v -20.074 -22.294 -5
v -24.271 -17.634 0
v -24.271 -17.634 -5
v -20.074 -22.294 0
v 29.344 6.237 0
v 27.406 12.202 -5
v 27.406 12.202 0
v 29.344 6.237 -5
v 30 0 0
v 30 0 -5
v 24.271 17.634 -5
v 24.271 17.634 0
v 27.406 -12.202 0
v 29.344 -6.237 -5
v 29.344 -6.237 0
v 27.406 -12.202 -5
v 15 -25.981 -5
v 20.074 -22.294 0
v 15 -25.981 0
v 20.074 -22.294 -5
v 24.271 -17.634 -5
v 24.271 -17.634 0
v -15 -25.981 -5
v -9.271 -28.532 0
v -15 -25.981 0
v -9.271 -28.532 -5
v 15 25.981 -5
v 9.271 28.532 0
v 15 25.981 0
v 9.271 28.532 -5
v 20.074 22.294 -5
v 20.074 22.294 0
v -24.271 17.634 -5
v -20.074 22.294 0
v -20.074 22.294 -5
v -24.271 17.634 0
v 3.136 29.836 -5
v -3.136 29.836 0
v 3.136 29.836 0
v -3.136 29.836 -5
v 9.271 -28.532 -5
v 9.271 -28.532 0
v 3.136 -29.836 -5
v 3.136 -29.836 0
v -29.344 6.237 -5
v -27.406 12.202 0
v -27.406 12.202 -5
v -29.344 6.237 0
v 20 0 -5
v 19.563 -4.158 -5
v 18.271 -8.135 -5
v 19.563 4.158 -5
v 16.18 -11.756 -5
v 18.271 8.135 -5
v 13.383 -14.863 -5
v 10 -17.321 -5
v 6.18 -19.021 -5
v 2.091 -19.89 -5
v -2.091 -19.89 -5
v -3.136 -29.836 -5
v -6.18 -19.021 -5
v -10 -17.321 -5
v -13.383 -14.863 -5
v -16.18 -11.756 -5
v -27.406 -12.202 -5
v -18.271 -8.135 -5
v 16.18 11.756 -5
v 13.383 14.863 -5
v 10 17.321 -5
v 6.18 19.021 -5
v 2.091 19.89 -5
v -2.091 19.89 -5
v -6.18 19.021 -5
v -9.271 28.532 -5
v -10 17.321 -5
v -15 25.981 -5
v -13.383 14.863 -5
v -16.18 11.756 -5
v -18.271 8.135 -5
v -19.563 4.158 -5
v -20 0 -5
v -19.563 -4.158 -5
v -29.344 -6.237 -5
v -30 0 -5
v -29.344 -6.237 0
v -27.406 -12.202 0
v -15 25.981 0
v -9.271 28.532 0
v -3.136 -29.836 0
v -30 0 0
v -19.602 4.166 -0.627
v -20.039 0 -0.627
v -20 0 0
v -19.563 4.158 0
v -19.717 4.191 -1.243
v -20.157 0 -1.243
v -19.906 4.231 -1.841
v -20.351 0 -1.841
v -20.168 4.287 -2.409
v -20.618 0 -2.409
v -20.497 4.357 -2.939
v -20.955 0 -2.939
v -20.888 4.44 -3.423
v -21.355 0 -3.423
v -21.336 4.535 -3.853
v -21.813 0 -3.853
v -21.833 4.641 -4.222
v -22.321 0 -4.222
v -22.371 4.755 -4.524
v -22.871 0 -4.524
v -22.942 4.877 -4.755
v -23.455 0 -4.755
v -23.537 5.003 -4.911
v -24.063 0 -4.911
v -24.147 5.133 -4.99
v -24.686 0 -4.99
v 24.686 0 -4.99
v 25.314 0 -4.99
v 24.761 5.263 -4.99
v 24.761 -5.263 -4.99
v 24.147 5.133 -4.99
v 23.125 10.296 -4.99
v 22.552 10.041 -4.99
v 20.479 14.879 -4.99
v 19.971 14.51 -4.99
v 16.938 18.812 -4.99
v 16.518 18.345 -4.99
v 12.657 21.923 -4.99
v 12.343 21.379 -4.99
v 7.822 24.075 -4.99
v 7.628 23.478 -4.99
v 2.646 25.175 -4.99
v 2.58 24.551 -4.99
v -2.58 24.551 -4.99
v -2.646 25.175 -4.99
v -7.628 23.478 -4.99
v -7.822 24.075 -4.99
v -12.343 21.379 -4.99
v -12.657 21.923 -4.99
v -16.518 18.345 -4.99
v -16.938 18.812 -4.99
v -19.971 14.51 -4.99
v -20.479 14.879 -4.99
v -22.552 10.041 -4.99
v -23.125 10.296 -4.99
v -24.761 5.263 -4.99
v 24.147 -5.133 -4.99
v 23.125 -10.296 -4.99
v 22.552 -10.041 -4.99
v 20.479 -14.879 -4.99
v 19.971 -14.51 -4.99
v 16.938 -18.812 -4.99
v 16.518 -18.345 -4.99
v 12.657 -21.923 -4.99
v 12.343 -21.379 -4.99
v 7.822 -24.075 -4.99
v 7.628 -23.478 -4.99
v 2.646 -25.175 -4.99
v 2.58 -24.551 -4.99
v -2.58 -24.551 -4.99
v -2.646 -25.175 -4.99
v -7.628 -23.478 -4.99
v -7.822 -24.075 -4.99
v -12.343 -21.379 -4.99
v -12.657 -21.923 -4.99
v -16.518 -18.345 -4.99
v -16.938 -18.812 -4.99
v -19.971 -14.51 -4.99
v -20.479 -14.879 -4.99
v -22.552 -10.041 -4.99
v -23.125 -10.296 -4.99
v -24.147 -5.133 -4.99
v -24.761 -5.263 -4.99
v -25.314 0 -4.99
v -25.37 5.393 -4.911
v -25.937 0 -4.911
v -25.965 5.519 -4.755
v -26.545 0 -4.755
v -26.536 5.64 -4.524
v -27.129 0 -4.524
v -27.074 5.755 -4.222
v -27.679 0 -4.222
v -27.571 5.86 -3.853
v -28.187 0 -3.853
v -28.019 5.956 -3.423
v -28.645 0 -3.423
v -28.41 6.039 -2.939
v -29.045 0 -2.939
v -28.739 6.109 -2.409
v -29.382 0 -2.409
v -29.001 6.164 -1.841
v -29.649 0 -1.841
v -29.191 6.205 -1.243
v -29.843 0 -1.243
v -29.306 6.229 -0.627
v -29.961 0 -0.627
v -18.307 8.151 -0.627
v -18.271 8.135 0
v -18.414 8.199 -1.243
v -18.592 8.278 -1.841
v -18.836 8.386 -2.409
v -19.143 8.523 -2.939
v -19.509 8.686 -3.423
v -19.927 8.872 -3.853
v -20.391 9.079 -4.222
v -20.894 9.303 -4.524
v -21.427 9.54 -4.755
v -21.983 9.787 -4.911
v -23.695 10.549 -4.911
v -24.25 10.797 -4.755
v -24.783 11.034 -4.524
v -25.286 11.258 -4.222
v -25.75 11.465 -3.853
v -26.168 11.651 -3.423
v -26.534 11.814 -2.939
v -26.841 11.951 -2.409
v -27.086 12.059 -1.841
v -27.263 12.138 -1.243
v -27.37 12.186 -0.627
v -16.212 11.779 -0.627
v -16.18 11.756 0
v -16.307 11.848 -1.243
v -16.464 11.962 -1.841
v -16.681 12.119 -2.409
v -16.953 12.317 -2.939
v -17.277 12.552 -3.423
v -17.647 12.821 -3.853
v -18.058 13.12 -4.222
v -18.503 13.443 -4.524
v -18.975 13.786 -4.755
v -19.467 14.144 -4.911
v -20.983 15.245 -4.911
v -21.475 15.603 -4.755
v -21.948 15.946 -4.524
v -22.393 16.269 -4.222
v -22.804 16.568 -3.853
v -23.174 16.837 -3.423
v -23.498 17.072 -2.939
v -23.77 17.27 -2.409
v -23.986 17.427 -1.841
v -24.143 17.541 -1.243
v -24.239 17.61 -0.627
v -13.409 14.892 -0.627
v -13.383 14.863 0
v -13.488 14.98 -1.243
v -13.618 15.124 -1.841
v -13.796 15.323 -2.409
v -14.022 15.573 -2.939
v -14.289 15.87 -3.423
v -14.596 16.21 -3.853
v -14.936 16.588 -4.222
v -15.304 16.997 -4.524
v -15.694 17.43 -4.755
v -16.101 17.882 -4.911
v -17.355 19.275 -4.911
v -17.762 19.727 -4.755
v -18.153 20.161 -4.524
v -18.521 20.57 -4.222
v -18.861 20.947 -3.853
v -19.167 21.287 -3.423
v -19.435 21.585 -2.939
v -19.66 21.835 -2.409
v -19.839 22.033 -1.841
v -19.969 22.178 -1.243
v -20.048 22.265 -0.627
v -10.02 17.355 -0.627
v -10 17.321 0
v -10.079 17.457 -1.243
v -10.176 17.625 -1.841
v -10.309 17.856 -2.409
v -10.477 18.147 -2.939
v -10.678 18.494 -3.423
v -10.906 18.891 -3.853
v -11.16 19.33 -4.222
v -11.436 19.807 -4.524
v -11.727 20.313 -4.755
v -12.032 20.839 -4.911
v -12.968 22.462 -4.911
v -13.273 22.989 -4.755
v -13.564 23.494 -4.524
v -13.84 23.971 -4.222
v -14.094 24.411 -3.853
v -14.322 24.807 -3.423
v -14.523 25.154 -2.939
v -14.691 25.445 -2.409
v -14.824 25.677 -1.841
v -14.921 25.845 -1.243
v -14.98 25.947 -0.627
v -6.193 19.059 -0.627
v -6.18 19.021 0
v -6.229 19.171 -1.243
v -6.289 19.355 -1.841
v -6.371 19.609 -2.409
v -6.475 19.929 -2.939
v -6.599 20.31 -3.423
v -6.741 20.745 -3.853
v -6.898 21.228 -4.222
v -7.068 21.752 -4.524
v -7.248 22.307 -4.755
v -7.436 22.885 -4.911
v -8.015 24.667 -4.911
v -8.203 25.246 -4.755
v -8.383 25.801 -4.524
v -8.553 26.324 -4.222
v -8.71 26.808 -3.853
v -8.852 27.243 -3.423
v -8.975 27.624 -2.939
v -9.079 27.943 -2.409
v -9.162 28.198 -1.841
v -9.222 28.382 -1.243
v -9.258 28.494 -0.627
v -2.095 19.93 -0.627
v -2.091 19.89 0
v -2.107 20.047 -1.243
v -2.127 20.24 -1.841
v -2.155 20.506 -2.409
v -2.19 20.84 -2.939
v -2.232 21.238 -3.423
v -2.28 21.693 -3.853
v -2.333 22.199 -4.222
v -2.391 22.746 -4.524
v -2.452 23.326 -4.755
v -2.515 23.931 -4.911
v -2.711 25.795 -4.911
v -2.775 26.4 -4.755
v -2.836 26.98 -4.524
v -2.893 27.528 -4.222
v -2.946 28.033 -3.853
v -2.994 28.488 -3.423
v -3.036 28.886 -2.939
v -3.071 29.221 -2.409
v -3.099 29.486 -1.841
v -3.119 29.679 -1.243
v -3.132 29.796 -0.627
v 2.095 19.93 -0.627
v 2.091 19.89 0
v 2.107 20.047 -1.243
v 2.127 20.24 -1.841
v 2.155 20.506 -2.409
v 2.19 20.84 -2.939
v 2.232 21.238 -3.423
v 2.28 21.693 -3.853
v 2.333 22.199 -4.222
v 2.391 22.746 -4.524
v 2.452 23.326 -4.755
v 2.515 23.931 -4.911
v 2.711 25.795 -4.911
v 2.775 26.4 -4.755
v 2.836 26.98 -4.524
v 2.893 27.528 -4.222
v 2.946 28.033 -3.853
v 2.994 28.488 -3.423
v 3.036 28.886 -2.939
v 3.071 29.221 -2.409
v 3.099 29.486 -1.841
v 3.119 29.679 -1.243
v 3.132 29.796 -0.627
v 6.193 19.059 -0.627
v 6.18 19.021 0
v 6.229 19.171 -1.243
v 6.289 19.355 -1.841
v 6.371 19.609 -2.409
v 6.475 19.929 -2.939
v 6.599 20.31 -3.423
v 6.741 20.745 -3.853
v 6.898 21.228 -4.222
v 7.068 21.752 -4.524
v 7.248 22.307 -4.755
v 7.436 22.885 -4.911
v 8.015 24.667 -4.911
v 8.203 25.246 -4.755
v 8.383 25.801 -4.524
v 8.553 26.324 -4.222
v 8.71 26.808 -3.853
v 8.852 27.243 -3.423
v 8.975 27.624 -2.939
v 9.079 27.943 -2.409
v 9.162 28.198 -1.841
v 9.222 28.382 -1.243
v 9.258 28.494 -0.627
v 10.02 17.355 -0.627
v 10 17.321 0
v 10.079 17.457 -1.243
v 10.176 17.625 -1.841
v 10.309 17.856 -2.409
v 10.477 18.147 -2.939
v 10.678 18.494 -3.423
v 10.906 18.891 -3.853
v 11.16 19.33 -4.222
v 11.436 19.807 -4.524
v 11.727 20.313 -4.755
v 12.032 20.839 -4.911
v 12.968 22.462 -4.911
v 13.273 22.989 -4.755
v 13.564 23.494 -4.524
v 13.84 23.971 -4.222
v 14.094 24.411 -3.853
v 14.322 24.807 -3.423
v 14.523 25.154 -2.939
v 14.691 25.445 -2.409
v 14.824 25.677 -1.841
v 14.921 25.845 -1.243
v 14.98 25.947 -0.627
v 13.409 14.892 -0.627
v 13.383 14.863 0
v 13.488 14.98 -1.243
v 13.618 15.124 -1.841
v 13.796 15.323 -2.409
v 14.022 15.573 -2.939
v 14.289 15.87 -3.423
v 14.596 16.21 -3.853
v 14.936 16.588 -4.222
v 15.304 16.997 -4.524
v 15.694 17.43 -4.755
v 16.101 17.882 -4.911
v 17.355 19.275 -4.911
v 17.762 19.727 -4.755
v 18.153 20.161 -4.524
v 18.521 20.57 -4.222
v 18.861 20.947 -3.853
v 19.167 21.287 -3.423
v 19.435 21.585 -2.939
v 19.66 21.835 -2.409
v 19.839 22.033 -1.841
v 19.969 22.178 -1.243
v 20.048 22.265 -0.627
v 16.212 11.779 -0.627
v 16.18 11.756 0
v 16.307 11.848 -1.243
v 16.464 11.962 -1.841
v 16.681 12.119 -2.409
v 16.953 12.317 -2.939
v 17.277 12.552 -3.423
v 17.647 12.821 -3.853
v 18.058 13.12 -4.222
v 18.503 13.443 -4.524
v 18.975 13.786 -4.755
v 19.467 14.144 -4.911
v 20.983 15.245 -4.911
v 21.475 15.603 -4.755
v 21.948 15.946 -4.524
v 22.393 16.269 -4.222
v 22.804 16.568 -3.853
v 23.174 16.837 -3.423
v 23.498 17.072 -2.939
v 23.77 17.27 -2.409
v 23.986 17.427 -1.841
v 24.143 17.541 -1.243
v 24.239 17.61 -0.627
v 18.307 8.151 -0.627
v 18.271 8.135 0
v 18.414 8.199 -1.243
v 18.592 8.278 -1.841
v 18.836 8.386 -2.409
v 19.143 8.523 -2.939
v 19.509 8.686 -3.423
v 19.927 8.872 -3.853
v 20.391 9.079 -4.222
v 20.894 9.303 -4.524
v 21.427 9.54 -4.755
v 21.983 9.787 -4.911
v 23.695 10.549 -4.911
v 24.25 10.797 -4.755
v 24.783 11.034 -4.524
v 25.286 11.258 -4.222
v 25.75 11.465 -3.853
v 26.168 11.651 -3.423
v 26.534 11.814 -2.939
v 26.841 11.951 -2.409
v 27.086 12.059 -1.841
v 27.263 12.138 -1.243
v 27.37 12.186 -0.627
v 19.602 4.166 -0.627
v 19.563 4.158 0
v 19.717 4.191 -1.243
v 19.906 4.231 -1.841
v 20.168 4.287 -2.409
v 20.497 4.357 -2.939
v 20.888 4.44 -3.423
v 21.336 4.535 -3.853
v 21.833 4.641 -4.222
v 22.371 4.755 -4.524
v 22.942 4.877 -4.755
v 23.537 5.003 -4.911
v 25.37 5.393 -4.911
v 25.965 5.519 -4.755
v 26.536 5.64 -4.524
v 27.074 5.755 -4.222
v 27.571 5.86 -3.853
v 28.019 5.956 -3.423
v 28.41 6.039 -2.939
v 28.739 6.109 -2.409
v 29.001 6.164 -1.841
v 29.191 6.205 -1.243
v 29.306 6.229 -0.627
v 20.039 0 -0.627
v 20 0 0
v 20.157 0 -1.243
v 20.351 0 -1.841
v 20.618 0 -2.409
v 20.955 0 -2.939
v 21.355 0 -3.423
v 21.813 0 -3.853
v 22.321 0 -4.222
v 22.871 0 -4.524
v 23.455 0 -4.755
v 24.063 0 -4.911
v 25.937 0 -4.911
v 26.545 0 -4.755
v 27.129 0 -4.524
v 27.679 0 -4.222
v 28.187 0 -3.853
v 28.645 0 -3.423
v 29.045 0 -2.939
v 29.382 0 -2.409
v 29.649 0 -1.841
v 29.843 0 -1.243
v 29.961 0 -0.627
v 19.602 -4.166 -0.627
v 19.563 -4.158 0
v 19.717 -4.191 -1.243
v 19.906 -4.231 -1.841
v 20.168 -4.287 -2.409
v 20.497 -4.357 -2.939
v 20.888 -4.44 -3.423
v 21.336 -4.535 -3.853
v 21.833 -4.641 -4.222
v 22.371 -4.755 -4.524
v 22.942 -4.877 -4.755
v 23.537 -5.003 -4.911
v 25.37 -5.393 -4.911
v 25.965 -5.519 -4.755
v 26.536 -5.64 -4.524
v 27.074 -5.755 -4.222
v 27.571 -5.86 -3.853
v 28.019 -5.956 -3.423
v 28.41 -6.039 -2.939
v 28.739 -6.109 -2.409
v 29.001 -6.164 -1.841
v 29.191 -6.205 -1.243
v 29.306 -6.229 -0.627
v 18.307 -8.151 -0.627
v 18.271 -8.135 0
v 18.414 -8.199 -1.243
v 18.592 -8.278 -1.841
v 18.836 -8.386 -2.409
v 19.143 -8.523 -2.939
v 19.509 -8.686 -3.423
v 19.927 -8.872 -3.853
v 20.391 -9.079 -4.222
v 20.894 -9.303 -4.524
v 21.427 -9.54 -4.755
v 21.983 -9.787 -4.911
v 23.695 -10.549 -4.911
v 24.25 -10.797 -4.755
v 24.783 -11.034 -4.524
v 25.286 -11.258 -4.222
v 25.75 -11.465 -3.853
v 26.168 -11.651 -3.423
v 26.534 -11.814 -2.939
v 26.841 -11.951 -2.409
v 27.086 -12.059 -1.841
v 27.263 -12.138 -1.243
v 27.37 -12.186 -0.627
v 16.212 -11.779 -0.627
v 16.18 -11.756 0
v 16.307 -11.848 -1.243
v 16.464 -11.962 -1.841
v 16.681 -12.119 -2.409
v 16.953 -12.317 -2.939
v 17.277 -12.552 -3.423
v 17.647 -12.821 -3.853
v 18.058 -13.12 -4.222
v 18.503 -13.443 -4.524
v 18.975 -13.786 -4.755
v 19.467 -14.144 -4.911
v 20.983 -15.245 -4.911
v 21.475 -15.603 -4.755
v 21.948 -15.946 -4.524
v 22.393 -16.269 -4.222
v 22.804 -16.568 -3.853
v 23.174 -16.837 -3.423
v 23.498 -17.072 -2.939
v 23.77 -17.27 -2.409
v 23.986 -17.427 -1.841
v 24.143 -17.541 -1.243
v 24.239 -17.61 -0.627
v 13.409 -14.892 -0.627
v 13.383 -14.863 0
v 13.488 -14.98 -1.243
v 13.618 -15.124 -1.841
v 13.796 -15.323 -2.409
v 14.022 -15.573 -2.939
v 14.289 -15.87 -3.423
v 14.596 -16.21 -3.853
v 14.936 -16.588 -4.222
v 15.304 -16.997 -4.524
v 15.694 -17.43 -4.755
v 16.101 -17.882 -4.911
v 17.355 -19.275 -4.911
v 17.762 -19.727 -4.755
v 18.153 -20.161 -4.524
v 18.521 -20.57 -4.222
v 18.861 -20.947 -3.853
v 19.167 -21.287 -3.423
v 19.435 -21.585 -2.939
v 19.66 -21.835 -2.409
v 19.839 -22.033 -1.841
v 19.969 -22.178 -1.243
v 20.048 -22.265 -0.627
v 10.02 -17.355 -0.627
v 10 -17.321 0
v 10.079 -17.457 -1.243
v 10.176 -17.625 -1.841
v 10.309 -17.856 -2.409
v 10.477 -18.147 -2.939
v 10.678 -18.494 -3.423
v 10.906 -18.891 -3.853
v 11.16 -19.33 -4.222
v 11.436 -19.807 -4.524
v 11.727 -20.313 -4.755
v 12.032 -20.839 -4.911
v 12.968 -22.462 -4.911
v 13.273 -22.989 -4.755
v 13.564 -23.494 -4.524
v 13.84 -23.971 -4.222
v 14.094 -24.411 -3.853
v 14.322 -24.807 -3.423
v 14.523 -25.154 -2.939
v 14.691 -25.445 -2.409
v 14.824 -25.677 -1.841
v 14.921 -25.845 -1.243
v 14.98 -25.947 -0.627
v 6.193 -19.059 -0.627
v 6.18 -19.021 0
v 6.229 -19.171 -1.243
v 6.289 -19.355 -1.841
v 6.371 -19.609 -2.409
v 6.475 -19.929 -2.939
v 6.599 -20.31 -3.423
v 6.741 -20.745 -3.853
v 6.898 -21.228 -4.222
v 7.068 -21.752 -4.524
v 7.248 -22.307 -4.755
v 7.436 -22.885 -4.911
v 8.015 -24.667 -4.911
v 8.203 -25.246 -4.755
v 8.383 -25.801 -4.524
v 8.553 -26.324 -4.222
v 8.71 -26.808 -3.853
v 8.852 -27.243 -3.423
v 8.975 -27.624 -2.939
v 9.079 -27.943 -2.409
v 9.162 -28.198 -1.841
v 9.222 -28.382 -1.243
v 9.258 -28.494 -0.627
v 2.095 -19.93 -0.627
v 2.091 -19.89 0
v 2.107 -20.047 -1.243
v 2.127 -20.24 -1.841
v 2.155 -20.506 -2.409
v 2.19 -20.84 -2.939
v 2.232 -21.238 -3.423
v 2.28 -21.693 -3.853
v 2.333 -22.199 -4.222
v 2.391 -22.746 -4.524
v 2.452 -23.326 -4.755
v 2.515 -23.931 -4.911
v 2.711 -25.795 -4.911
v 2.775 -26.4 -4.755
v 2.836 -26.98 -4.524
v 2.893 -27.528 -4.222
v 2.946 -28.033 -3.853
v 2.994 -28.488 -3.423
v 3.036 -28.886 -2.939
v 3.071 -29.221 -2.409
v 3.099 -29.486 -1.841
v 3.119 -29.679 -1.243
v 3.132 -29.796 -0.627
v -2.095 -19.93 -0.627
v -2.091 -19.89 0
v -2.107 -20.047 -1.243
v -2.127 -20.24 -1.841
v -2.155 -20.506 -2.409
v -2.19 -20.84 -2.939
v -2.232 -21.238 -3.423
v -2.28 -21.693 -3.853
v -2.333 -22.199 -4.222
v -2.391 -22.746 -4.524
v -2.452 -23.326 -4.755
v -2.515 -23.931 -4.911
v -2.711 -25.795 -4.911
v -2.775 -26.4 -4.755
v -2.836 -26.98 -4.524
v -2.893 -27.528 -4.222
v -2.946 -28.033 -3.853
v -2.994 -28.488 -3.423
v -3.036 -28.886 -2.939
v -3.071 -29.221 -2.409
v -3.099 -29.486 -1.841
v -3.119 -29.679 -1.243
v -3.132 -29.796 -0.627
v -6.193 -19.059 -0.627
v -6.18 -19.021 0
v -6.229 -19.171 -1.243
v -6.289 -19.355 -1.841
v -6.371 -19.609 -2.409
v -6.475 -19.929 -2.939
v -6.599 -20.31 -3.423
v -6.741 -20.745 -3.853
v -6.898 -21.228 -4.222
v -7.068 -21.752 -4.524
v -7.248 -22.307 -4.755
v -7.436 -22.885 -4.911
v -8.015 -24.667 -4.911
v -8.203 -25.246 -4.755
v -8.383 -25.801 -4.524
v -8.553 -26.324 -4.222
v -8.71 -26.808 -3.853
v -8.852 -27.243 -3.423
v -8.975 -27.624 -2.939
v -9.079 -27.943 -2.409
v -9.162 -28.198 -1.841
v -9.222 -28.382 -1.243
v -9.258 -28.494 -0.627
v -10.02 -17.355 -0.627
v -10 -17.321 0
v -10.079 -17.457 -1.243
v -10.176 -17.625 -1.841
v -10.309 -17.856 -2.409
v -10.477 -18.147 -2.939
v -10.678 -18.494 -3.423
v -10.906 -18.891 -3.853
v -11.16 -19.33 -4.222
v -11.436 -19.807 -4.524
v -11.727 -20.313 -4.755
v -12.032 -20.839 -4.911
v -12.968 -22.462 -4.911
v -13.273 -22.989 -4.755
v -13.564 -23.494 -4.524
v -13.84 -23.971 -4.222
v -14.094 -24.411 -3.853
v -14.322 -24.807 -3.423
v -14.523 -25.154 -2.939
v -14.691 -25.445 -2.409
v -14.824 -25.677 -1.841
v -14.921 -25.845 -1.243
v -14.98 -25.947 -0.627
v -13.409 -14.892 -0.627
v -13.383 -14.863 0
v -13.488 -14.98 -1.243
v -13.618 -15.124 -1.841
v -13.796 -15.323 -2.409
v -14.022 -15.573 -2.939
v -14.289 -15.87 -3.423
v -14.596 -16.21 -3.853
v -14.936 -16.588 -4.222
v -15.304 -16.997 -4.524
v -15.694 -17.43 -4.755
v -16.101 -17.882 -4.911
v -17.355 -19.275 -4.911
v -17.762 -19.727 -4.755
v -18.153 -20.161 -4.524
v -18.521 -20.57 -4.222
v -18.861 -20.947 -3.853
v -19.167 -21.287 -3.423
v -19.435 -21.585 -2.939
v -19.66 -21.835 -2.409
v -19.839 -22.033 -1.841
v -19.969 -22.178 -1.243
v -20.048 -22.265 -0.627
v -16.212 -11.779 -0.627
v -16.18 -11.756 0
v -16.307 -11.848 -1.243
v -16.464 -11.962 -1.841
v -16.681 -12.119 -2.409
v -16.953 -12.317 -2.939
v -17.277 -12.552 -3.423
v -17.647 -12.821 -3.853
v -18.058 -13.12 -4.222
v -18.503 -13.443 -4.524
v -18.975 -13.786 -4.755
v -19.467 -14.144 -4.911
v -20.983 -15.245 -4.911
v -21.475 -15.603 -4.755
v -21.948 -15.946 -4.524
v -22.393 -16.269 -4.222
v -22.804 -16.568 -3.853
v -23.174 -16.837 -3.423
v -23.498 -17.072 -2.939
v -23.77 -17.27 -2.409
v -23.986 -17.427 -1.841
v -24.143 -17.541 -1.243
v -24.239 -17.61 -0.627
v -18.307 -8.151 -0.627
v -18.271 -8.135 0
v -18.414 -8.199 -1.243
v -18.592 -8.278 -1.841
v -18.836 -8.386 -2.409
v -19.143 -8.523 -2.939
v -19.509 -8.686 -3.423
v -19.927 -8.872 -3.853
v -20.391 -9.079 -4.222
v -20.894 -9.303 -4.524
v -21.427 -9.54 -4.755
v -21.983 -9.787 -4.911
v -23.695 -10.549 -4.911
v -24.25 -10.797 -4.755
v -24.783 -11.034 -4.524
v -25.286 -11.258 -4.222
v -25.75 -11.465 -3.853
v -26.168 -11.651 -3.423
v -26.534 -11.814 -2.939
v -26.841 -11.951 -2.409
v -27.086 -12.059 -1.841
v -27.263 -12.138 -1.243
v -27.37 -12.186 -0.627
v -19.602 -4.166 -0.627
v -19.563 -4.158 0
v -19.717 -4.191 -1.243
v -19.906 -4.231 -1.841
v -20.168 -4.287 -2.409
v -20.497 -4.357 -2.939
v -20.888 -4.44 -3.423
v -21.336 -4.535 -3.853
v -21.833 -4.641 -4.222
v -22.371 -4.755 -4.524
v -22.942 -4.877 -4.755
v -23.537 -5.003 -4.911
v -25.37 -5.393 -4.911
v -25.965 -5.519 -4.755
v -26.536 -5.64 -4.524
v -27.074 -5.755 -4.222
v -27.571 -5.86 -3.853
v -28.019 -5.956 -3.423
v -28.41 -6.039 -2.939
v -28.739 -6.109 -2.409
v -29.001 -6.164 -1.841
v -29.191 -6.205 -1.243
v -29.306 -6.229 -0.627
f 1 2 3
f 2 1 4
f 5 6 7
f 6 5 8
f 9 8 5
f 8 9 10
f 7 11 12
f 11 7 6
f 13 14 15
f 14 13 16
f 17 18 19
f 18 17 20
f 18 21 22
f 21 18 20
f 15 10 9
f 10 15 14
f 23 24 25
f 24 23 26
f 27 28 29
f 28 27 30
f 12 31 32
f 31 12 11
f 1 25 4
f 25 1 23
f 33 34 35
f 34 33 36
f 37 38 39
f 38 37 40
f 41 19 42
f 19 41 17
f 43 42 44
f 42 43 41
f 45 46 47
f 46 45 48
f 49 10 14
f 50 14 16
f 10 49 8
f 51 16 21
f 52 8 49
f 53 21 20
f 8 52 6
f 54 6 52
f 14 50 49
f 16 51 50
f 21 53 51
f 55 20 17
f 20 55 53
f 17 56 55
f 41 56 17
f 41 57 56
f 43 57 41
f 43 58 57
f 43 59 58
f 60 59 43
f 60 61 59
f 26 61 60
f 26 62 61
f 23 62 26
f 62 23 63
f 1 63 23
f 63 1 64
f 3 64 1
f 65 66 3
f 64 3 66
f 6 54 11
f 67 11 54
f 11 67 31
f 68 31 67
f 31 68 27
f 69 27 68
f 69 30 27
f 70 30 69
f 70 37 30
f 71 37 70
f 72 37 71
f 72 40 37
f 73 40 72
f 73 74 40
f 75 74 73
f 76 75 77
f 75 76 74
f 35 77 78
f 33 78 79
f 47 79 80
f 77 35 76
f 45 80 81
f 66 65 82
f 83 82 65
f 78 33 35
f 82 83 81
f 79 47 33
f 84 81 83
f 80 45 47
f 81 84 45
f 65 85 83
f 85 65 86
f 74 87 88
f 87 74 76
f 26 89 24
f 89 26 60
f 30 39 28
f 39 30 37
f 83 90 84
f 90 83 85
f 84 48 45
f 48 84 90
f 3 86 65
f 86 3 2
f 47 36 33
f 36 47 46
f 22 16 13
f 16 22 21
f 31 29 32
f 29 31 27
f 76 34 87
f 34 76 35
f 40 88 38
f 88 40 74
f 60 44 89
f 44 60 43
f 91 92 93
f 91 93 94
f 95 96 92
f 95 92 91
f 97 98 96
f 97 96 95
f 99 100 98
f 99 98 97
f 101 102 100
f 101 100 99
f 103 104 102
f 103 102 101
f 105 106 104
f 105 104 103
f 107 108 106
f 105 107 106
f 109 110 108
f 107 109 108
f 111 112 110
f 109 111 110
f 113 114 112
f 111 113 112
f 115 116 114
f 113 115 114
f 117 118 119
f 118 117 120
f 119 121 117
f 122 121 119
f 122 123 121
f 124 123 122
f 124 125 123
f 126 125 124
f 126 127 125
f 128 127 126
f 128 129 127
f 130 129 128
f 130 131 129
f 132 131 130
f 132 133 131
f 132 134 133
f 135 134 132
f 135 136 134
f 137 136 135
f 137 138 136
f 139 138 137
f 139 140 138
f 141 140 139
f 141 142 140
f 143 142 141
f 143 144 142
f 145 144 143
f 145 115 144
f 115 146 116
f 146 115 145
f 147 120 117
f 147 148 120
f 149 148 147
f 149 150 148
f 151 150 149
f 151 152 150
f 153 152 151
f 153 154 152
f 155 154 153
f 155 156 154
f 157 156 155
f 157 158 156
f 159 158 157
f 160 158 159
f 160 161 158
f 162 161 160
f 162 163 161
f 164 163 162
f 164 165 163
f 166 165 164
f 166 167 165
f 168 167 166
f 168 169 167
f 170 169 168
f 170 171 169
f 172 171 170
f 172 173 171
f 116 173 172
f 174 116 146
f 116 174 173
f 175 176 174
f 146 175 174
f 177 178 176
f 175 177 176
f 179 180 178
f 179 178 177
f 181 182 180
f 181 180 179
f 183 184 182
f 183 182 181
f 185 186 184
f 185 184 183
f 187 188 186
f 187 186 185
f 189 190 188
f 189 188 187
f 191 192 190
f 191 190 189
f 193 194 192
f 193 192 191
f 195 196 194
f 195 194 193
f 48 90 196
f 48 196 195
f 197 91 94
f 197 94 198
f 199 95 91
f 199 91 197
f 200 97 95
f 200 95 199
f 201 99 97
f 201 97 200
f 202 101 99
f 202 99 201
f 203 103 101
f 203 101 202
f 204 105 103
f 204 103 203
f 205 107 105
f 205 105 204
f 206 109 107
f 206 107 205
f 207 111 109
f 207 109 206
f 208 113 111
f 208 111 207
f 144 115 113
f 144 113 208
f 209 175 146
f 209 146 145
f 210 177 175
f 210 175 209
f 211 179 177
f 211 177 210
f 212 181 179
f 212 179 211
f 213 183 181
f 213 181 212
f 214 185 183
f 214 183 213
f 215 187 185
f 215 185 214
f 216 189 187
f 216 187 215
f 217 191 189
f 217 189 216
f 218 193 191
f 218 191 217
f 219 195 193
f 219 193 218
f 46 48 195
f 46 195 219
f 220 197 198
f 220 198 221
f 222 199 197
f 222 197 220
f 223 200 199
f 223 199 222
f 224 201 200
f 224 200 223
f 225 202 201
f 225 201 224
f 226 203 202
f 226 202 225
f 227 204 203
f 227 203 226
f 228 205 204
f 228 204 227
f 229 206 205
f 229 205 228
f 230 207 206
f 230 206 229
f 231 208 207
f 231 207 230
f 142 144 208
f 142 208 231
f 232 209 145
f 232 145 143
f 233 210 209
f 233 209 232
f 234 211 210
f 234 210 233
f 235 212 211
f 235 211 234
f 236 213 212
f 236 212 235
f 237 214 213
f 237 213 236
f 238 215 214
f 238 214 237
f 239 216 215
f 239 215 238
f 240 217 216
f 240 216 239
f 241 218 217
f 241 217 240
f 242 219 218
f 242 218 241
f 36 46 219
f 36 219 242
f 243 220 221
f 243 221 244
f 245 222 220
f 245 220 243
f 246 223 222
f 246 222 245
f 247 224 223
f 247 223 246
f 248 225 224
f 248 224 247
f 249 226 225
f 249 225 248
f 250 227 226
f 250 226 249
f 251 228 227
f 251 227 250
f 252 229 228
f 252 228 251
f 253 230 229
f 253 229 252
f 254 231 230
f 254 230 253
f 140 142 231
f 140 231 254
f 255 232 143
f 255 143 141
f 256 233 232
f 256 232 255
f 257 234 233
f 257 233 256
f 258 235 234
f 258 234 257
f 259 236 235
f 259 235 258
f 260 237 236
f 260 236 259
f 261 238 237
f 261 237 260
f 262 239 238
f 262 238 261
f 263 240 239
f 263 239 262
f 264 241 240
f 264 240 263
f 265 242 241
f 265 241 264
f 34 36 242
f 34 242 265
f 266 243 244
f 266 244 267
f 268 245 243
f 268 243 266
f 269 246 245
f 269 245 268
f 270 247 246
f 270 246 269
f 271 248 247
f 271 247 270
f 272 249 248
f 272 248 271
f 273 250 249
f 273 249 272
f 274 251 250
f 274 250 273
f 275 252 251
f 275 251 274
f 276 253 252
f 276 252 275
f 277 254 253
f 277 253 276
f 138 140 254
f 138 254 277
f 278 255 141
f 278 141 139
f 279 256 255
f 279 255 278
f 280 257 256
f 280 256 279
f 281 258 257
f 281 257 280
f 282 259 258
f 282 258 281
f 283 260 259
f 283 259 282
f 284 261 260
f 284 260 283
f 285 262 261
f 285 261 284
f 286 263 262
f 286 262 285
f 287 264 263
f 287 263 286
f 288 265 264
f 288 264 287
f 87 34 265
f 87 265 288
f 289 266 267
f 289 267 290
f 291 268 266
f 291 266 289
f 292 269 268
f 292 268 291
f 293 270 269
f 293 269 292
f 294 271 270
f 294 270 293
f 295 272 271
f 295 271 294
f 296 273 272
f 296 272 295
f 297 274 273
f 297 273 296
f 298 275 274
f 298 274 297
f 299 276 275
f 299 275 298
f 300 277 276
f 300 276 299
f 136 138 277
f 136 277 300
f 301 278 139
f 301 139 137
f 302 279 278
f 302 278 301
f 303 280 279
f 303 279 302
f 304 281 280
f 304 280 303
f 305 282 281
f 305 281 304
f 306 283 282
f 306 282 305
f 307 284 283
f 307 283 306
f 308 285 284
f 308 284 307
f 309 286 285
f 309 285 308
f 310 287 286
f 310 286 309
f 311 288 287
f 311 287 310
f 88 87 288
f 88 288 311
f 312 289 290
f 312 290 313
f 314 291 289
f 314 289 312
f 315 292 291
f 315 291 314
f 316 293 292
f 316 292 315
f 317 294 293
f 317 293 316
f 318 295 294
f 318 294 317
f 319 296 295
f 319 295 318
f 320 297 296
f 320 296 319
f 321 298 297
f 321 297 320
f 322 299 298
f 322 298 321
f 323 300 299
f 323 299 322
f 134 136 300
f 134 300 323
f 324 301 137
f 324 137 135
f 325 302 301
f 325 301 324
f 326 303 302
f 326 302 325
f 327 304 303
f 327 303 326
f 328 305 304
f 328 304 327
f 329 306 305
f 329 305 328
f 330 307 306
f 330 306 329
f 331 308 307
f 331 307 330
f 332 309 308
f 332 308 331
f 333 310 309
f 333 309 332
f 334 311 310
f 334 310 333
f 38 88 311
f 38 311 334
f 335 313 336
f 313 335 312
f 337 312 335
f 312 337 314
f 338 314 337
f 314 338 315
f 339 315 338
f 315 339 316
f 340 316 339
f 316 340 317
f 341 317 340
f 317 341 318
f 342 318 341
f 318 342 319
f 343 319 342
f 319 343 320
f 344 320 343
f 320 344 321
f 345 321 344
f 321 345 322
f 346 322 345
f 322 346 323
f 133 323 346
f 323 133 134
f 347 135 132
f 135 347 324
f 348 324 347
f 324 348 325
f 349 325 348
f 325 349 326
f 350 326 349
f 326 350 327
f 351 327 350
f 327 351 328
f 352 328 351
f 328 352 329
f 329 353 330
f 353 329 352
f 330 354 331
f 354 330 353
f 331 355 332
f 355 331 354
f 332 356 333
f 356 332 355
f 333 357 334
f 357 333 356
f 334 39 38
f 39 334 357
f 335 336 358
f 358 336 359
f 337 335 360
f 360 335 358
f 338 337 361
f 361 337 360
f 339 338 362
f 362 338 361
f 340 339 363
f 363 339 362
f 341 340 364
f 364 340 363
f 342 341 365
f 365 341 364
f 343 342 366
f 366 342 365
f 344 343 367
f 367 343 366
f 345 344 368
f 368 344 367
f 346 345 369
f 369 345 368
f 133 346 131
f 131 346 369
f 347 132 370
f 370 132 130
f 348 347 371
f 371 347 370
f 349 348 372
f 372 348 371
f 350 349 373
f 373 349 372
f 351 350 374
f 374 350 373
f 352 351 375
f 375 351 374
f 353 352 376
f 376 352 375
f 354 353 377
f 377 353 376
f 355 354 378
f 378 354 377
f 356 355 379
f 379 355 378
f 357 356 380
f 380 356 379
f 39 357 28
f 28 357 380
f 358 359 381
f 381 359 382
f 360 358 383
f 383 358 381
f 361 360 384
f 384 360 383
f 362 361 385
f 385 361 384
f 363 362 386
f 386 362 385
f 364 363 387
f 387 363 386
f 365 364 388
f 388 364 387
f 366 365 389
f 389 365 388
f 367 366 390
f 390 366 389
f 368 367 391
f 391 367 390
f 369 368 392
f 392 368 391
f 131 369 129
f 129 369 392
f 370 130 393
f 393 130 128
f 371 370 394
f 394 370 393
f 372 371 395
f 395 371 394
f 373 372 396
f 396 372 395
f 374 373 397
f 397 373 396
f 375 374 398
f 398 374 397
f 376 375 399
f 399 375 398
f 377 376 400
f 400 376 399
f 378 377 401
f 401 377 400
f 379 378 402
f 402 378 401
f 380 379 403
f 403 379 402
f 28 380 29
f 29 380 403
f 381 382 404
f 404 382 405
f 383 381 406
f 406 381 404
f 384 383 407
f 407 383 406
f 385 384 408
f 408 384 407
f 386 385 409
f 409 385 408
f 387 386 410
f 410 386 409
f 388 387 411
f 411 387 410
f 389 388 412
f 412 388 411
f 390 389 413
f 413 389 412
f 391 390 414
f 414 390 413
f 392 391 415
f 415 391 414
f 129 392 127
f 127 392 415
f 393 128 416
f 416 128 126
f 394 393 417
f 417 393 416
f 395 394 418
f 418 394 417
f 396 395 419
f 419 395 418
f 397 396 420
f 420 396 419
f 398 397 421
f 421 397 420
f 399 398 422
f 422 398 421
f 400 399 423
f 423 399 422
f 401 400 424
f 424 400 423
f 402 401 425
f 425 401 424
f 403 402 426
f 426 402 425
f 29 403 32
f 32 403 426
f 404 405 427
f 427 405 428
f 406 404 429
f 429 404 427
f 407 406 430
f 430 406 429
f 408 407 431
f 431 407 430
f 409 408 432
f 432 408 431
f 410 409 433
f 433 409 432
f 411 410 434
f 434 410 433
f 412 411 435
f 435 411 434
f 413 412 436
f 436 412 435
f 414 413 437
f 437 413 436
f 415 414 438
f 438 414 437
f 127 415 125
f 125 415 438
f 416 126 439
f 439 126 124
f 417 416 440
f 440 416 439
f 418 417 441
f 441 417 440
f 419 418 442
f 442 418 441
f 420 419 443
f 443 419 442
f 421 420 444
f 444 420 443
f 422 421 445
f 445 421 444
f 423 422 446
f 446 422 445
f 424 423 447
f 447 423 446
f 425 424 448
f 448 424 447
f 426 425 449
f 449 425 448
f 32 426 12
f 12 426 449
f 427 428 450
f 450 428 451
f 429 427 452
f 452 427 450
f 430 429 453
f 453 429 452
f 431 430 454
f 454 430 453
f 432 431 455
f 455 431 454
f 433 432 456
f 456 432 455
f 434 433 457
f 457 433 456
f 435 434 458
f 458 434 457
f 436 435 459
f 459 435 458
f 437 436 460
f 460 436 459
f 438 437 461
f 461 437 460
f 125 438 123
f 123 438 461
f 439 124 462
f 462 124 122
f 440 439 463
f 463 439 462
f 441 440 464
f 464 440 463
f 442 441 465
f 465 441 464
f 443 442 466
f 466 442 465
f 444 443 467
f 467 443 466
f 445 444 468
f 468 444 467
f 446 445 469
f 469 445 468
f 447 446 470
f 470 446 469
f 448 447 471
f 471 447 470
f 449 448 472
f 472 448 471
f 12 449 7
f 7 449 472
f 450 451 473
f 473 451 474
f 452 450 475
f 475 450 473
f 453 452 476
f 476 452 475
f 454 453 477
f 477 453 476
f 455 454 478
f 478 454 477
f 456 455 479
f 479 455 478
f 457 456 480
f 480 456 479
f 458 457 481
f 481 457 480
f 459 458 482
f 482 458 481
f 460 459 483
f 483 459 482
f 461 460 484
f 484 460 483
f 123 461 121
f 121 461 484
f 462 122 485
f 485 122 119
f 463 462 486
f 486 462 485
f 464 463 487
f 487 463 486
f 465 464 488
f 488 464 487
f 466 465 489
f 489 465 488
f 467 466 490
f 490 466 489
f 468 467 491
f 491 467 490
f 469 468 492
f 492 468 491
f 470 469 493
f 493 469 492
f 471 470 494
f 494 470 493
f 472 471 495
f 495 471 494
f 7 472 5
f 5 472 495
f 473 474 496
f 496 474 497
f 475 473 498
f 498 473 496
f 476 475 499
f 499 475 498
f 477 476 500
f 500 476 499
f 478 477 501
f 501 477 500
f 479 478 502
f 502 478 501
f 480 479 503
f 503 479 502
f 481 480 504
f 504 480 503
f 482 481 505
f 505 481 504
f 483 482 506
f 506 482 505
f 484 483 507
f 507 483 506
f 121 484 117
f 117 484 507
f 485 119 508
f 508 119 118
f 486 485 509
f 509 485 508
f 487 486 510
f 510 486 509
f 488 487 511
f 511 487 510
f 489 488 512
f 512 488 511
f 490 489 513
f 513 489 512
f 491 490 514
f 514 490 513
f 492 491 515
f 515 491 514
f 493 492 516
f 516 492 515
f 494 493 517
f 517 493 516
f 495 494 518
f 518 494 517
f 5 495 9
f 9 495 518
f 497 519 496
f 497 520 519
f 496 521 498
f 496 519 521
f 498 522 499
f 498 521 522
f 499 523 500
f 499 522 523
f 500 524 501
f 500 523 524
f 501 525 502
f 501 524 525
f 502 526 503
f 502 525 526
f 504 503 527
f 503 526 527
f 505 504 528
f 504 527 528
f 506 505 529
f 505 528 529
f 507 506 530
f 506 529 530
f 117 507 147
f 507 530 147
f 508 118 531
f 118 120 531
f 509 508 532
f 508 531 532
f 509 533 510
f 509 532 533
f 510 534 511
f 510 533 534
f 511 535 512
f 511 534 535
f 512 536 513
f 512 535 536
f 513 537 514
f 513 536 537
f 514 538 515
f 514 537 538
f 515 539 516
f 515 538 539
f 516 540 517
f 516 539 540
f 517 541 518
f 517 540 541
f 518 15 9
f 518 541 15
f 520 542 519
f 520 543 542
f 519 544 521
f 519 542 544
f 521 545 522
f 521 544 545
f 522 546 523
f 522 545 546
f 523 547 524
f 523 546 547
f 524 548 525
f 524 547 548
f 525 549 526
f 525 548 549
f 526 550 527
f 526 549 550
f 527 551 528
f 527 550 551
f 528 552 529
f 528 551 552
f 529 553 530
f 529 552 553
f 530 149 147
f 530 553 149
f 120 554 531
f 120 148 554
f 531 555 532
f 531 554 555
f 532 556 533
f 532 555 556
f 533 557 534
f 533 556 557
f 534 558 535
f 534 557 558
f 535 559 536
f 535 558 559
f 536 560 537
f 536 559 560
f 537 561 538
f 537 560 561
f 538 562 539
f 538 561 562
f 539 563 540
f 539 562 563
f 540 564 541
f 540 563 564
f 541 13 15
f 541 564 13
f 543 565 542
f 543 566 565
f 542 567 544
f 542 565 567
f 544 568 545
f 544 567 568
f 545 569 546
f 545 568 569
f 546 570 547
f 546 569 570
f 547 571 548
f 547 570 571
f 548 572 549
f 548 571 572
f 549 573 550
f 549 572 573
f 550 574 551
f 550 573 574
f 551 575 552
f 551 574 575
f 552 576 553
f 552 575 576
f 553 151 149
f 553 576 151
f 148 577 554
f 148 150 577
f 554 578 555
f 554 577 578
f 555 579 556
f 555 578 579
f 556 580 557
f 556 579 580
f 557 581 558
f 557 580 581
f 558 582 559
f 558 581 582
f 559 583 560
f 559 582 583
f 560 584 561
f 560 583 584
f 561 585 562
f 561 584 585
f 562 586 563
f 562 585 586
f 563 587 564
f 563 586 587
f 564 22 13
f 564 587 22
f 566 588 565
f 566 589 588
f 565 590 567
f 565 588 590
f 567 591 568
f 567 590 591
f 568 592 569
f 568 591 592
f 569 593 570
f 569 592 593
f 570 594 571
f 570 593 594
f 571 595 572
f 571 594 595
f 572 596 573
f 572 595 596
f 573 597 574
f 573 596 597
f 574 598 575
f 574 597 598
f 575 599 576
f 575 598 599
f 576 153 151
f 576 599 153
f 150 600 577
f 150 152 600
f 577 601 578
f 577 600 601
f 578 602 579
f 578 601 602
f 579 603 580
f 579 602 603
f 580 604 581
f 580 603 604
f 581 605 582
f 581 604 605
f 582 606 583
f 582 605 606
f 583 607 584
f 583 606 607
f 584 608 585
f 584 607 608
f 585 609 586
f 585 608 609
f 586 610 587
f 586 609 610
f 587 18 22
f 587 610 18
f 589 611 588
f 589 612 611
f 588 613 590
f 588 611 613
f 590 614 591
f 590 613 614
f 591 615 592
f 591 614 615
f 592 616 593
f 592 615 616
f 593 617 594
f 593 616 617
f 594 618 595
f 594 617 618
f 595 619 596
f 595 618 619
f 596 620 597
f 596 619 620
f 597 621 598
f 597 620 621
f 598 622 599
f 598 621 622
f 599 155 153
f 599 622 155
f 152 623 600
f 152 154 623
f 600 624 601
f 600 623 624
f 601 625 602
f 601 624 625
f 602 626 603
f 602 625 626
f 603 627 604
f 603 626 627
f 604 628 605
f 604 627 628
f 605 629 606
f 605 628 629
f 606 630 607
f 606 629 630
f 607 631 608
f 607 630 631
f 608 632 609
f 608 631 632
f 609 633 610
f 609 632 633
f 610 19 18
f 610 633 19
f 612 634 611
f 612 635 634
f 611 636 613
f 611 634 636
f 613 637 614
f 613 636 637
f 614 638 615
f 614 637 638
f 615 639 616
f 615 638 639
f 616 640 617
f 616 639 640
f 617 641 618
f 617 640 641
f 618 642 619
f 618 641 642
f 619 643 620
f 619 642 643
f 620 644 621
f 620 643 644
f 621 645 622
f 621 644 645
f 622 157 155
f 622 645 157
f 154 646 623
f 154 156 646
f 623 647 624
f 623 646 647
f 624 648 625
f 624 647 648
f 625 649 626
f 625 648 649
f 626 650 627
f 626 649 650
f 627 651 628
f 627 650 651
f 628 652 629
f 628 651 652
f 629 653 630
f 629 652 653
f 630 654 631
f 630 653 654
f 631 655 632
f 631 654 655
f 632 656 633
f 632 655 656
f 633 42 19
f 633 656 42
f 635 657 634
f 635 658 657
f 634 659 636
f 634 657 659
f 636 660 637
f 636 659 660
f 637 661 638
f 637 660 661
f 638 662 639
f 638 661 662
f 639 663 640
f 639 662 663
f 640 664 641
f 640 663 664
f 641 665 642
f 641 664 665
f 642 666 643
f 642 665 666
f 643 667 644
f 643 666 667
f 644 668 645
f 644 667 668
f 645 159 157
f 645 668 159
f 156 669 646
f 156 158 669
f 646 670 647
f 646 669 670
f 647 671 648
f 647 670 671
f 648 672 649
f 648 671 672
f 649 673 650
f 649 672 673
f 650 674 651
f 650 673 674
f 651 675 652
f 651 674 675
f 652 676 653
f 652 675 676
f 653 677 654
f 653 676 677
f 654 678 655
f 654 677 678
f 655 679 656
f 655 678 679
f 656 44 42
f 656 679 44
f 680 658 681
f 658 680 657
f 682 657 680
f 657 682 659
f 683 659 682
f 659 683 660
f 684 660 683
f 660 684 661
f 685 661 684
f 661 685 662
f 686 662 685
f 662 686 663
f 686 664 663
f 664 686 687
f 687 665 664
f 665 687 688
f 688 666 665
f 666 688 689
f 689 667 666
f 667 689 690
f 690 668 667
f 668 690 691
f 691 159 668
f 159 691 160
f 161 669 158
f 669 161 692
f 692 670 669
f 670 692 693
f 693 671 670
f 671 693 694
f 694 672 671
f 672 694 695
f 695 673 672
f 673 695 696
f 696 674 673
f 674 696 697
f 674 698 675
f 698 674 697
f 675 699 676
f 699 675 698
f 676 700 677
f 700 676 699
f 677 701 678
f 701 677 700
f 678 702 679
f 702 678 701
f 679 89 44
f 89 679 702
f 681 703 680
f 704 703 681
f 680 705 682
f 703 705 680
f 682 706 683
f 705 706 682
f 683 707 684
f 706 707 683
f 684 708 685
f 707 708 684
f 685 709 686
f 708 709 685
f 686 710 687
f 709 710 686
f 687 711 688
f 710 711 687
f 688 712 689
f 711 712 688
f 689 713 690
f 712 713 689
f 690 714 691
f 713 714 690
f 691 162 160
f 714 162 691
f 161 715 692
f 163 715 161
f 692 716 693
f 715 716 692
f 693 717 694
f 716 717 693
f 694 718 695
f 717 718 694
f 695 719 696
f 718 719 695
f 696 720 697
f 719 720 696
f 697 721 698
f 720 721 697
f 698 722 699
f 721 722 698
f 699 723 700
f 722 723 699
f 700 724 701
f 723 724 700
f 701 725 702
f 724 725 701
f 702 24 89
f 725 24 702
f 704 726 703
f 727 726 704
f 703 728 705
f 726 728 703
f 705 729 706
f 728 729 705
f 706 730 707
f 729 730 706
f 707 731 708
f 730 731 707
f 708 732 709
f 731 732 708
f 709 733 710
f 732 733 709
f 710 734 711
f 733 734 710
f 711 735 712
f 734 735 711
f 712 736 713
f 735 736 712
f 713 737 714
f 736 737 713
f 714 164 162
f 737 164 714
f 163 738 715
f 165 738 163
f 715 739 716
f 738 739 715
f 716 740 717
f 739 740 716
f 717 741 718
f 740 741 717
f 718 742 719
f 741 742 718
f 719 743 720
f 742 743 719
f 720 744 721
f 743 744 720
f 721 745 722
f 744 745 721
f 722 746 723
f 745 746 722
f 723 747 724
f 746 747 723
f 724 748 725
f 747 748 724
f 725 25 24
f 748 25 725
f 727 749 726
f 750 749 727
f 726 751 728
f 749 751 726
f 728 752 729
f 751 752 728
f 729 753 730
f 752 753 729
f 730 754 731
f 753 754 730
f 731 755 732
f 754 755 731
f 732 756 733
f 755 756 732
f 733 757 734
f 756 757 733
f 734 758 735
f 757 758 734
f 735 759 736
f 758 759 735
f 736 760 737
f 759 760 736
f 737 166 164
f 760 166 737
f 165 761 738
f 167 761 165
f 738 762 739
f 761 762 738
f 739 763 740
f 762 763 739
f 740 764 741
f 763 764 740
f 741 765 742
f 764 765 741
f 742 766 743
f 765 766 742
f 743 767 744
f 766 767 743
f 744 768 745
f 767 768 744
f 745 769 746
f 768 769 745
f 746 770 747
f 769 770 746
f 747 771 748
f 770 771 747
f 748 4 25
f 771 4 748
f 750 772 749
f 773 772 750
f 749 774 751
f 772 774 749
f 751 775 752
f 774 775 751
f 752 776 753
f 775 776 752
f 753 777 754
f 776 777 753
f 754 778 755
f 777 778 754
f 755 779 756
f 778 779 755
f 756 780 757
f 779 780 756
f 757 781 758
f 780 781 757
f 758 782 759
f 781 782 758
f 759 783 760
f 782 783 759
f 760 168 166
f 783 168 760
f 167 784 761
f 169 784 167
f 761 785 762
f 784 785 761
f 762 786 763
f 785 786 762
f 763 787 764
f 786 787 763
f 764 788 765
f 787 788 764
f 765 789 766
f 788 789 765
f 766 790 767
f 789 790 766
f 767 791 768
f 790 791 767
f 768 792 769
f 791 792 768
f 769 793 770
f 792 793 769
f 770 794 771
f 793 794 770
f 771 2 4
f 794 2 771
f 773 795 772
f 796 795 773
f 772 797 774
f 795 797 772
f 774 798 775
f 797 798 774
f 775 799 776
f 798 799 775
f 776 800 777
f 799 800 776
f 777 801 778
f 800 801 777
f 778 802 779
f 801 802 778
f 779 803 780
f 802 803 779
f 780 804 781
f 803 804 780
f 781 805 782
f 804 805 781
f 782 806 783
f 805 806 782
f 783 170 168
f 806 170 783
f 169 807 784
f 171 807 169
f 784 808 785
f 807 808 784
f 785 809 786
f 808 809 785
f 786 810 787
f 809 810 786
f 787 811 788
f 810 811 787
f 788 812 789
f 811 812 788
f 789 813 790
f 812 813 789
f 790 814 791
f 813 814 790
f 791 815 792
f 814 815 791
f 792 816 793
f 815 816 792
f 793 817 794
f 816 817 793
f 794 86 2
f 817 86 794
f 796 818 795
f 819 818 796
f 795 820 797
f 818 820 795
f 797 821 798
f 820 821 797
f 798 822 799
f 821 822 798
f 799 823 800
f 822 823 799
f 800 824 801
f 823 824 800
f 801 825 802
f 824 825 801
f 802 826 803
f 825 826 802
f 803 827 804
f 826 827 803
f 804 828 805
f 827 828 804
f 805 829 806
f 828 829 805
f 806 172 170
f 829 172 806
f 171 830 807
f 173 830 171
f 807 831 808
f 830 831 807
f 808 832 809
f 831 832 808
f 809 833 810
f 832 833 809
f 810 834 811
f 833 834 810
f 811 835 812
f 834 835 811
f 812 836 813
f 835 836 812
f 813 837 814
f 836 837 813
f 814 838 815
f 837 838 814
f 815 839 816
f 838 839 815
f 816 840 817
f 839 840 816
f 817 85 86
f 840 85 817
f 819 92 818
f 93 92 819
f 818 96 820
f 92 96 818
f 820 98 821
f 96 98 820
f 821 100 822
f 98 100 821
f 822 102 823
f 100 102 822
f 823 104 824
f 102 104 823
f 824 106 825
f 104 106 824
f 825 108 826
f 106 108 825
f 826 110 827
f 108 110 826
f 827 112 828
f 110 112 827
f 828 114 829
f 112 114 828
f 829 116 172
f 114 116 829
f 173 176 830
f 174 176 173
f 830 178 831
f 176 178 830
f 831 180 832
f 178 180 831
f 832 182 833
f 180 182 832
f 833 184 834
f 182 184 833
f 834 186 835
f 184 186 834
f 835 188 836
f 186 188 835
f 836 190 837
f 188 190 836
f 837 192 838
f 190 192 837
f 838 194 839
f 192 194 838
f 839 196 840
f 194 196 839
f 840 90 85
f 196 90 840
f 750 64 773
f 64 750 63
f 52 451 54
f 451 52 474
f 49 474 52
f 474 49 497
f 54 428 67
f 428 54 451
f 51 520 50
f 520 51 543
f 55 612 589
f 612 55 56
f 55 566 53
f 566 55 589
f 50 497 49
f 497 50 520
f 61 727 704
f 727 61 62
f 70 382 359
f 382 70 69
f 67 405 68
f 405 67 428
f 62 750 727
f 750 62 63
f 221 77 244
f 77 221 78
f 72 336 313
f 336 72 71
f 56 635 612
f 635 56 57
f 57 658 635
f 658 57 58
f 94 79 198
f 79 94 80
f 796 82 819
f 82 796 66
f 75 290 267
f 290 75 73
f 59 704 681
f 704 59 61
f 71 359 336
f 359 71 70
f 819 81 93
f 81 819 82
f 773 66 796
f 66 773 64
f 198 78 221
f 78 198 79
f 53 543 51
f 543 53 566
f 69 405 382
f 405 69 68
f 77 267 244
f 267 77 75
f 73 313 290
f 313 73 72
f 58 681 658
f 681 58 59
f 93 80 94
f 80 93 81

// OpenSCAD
circularFillet();

module fillet(f){
	difference(){   //fillet shape
		square(f);
		translate([f,f,0])
		circle(f,$fn=20);
	}
}

module circularFillet(d=50,r=5,concave=false){
    if(concave){
        difference(){
            rotate_extrude()translate([d/2-r ,0,0])circle(r=r,$fn=20);
            translate([-d,-d,0])cube([2*d-r,2*d-r,2*r]);
            cylinder(h=2*r,d=d-r,center=true);
        }
    }
    else{
        difference(){
            translate([0,0,-r])cylinder(h=r,d=d+2*r);  //outer edge
            rotate_extrude()translate([d/2 ,0,0])circle(r=r,$fn=50);
            //cylinder(h=2*r,d=d,$fn=50,center=true); //inner edge
            cylinder(h=2*r,d=d-2*r,center=true);
        }
    }
} 
